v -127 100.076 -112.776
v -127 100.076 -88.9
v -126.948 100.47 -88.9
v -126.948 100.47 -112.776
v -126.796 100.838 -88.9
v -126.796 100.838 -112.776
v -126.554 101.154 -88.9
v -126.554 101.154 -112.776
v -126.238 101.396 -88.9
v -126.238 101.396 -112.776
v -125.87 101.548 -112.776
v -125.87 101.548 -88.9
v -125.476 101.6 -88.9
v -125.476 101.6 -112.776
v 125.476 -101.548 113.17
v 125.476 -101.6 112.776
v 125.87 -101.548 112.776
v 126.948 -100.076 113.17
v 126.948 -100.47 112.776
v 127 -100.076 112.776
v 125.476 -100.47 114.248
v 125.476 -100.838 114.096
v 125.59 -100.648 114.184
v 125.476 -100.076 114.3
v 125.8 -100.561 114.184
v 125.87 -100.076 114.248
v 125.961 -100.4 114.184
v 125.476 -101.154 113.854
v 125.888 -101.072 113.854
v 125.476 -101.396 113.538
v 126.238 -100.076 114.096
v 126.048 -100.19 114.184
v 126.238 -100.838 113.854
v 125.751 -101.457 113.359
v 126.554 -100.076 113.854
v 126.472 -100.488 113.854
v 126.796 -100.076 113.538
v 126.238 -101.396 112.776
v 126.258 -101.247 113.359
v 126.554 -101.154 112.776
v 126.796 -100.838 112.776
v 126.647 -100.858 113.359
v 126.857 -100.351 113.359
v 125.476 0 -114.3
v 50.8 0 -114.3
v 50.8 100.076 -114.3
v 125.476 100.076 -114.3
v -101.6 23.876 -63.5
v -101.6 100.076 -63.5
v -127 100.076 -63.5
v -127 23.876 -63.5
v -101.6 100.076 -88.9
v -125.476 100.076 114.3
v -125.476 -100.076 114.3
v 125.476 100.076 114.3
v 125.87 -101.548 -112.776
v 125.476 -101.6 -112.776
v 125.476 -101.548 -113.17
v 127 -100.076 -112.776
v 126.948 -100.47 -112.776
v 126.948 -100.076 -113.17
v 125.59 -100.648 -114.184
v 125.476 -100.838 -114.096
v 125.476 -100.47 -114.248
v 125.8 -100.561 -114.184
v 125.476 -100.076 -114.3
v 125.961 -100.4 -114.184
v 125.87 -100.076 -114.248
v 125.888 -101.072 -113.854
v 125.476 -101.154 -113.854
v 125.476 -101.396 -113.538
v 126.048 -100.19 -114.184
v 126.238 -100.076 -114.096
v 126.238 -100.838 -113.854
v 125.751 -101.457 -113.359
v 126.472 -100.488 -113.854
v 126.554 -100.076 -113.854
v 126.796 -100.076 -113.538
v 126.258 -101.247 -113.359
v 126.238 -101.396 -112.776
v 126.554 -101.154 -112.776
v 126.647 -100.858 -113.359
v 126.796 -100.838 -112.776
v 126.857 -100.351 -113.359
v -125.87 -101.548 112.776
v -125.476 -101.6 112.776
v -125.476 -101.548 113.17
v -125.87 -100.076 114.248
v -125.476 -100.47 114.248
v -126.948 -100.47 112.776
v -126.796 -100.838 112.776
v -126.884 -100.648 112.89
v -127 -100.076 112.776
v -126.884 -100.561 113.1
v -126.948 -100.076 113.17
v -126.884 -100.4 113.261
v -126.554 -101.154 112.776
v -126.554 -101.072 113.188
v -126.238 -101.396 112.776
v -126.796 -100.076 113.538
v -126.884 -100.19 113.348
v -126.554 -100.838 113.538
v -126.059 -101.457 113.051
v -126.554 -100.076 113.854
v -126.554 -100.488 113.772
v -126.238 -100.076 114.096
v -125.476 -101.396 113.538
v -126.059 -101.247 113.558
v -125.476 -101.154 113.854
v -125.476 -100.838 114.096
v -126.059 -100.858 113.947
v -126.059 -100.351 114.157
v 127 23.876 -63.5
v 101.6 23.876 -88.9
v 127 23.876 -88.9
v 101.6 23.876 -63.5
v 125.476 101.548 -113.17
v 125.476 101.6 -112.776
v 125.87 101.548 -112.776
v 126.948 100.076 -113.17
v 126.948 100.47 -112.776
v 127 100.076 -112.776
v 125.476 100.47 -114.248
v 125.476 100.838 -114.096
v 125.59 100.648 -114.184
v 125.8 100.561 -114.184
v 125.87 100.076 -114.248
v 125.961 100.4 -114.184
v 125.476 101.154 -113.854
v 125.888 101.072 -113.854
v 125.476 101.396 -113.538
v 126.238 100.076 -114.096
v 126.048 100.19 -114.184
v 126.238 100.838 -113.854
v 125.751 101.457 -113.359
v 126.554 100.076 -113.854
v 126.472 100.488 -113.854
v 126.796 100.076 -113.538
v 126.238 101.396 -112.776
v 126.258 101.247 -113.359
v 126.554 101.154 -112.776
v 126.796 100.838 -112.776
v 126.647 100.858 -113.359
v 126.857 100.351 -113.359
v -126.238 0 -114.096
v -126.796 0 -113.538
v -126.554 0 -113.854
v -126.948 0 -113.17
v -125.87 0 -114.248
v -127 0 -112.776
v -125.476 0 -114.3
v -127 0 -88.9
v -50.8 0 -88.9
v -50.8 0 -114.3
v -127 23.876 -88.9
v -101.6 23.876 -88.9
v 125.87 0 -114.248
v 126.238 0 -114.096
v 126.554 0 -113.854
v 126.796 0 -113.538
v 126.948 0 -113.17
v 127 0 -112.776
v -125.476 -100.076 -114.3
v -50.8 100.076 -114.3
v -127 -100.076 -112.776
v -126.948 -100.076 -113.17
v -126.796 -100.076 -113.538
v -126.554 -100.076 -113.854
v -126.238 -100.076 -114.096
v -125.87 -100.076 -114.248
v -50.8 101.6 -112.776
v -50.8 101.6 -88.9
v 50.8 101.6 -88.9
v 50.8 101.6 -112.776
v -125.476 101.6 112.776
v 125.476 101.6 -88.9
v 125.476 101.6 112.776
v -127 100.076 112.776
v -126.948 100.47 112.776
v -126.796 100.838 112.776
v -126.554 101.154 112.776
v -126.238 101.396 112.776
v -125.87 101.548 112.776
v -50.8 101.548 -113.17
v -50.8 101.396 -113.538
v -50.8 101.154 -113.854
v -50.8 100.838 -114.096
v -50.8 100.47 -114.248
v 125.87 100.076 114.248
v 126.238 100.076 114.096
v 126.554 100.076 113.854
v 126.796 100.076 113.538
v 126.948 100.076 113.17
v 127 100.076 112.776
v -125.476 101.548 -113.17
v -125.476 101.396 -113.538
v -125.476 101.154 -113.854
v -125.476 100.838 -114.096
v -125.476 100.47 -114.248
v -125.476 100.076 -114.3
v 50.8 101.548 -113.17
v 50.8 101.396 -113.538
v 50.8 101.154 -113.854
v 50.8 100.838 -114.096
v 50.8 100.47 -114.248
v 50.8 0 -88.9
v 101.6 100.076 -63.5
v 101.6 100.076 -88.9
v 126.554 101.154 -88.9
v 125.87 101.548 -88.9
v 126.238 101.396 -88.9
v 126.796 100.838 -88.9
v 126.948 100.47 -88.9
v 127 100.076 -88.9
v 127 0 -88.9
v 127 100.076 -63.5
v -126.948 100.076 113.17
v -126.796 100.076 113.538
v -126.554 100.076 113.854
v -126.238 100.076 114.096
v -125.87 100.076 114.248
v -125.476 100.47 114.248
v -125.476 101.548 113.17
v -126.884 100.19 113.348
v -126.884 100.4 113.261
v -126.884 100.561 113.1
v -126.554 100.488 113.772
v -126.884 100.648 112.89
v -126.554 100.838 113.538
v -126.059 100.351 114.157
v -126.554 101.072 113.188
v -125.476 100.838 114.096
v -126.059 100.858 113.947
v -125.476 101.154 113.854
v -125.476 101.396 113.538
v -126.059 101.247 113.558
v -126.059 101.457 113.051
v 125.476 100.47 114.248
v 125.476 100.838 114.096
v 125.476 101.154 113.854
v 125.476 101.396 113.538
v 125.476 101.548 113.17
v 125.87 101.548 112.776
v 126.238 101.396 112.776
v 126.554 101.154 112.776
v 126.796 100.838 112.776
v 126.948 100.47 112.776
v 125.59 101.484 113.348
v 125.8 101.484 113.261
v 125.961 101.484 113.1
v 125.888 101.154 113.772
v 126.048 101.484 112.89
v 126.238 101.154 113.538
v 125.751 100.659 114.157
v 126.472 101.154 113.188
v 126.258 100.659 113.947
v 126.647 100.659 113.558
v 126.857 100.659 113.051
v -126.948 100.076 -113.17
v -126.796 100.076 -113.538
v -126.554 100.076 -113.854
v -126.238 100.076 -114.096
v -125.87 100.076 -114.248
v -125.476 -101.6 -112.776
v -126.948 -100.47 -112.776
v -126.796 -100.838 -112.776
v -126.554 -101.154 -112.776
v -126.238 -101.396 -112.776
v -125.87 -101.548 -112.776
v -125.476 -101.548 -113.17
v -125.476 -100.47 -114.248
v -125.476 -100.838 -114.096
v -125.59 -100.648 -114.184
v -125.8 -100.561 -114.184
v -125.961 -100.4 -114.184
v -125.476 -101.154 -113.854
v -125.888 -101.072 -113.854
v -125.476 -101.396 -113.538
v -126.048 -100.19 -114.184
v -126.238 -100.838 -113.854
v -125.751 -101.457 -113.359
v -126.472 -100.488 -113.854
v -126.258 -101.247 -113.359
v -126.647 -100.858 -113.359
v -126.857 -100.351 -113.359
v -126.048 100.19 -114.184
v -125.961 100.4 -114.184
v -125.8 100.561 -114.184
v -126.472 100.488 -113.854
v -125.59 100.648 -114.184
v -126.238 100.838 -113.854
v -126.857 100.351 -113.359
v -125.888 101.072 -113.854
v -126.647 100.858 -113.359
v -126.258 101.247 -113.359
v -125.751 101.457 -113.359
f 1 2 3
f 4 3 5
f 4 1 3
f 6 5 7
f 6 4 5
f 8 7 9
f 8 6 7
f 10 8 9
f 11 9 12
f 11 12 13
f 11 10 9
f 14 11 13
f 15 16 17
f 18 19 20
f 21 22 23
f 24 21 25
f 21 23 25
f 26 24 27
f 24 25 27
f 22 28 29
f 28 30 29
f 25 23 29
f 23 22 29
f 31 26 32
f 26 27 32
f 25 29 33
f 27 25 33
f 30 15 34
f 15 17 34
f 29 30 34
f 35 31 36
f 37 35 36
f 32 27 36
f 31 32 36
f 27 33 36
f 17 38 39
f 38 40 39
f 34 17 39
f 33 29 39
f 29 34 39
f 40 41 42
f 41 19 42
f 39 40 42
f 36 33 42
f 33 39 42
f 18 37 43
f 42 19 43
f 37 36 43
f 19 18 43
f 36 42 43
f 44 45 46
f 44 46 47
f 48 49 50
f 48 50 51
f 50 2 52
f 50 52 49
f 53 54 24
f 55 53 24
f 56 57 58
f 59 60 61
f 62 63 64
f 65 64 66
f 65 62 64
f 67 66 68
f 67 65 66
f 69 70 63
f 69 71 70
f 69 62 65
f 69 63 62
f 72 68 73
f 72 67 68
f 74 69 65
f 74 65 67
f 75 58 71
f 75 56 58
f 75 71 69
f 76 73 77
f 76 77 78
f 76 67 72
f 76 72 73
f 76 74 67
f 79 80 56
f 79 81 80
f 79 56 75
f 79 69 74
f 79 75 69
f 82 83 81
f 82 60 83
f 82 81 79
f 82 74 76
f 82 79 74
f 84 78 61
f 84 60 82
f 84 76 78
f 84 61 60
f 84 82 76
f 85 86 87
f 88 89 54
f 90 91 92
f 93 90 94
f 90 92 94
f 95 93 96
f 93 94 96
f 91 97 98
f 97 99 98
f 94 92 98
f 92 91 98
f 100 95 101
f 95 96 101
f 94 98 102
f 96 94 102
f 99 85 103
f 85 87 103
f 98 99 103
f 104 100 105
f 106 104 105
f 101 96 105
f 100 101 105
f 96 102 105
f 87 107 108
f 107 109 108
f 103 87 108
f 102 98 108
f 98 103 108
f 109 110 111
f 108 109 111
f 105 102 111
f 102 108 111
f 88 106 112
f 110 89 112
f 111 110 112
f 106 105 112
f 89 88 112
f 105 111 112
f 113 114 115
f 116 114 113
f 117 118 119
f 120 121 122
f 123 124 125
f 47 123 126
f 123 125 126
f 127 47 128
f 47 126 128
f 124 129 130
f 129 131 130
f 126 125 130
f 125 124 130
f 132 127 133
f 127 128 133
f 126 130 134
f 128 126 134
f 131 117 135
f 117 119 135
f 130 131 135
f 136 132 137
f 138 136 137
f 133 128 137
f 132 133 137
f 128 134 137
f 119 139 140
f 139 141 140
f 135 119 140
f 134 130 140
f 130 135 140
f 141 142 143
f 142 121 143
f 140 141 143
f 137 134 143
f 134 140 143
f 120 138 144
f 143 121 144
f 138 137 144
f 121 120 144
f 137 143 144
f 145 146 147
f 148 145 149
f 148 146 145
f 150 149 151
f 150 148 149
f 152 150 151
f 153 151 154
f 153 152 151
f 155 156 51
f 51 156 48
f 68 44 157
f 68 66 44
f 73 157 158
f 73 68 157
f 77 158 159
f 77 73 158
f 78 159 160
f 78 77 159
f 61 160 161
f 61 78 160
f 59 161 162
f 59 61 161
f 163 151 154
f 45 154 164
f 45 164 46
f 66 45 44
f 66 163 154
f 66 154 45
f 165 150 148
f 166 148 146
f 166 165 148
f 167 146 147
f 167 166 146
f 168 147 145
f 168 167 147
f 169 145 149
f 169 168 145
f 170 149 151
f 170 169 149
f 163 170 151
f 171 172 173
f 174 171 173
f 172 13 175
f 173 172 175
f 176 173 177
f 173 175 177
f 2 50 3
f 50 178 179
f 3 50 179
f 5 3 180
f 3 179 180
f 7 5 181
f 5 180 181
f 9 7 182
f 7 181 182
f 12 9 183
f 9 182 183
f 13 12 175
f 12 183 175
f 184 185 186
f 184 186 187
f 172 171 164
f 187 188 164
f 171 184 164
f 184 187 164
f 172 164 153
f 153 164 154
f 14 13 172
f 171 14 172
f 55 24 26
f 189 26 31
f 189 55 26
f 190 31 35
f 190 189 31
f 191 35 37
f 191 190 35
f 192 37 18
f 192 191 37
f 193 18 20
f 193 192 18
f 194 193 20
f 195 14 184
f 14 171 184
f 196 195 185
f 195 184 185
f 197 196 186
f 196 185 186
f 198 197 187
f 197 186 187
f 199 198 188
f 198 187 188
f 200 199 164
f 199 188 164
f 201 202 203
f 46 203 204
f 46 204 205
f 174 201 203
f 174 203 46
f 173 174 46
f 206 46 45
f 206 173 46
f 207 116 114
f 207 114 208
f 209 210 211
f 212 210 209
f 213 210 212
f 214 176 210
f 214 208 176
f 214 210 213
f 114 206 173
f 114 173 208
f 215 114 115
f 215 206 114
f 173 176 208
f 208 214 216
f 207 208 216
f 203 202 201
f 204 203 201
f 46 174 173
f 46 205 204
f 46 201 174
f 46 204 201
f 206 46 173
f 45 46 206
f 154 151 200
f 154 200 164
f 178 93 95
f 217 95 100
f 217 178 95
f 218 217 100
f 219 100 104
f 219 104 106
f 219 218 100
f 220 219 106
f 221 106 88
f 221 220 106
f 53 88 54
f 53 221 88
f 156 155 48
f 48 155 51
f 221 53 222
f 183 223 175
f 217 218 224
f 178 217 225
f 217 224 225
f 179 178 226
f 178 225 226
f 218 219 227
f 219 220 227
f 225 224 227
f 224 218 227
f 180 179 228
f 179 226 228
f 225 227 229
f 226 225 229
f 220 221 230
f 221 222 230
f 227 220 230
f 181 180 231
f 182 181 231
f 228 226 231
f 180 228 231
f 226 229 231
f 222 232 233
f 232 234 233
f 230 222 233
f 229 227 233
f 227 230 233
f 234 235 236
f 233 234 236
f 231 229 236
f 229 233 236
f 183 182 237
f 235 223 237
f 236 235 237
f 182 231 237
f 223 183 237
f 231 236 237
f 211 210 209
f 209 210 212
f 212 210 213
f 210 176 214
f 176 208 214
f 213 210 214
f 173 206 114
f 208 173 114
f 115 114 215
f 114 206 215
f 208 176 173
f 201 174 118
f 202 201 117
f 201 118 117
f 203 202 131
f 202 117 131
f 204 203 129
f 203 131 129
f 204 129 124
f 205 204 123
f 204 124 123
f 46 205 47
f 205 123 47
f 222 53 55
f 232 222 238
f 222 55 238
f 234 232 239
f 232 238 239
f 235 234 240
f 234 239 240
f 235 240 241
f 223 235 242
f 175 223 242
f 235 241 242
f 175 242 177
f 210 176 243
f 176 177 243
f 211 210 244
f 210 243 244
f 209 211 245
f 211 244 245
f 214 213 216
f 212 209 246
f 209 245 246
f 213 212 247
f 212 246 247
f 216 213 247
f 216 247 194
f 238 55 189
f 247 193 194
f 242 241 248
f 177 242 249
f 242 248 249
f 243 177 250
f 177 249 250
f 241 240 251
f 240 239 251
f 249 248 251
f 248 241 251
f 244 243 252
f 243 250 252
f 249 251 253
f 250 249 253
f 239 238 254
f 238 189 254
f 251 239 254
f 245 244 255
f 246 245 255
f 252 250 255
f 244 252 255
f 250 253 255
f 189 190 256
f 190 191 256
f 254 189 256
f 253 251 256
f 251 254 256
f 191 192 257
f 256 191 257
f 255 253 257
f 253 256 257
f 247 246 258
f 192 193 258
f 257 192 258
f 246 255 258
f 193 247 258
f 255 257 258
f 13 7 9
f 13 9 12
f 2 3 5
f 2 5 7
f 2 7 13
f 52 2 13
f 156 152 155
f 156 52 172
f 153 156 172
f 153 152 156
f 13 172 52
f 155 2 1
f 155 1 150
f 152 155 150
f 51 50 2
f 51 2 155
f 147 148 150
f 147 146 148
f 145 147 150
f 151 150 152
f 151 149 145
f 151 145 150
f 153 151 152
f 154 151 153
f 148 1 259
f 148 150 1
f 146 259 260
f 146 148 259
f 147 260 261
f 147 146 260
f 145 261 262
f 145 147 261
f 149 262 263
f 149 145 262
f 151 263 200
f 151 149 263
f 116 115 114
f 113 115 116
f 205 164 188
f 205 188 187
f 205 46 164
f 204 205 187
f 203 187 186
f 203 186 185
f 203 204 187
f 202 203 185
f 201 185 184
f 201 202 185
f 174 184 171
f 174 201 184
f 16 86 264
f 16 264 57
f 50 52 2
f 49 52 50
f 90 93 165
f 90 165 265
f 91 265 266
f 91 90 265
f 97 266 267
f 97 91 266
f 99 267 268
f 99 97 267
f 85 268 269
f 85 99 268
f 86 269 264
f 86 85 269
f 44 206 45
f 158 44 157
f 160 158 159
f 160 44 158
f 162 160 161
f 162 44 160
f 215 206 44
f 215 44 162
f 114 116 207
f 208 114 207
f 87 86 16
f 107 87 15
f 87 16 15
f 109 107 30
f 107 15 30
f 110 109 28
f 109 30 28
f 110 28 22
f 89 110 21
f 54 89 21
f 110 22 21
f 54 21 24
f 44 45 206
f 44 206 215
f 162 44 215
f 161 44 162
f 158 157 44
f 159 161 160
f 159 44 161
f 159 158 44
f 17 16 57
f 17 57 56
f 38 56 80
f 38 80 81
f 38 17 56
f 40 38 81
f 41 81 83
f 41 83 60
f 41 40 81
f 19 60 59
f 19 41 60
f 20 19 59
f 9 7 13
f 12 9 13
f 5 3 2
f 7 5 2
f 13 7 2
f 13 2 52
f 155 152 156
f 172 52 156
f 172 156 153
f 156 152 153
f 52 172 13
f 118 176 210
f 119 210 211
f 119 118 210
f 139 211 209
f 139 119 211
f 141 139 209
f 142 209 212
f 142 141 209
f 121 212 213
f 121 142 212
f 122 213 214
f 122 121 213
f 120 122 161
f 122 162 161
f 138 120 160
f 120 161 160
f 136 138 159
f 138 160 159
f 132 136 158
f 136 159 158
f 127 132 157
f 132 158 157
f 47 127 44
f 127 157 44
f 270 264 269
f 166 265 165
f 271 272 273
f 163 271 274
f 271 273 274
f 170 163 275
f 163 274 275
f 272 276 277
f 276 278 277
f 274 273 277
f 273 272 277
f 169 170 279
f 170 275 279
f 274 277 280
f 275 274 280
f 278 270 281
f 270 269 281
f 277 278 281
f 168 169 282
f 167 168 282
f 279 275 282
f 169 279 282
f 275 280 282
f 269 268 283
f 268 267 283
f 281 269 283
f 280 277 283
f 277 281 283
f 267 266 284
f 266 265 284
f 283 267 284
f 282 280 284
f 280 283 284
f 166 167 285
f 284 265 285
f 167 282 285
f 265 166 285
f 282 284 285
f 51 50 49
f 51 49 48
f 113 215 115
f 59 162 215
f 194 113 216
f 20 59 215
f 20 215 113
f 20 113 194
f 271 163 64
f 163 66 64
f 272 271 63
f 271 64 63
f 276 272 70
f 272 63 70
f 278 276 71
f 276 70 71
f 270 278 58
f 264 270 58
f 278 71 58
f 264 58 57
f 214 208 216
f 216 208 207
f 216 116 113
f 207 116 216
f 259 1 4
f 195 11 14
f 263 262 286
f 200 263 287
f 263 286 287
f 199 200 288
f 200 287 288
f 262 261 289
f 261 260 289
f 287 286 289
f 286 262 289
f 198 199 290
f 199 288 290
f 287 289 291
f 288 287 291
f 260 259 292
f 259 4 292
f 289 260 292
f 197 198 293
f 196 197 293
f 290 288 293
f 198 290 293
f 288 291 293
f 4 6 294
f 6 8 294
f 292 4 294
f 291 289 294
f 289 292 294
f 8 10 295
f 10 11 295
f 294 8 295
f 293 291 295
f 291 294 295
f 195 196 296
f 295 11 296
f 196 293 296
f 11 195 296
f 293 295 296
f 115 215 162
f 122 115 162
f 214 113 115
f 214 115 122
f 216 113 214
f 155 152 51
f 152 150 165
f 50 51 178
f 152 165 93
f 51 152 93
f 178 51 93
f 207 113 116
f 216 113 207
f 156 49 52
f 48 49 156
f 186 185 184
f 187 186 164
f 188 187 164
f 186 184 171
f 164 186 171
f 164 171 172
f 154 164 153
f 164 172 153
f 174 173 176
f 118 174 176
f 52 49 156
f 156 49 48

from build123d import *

# Parameters (mm, degrees)
F0_W      = 254
F0_H      = 228.6
F1_DEPTH  = 101.6
F2_W      = 76.2
F2_H      = 101.6
F3_DEPTH  = 25.4
F4_DEPTH  = 25.4
F5_R      = 1.524
F5_2_R    = 1.524
F5_3_R    = 1.524
F6_W      = 76.2
F6_H      = 25.4
F7_DEPTH  = 25.4
F8_DEPTH  = 25.4
F9_W      = 76.2
F9_H      = 25.4
F10_DEPTH = 25.4
F11_DEPTH = 25.4


with BuildPart() as f1:
    # F0 (on Front) → F1 (new body, symmetric)
    with BuildSketch(Plane.XZ):
        Rectangle(F0_W, F0_H)
    extrude(amount=F1_DEPTH, both=True)

    # F2 (on face) → F3 (cut)
    with BuildSketch(Plane(origin=(0, 0, -114.3), x_dir=(1, 0, 0), z_dir=(0, 0, -1))):
        with Locations((88.9, -50.8)):
            Rectangle(F2_W, F2_H)
        with Locations((-88.9, -50.8)):
            Rectangle(F2_W, F2_H)
    extrude(amount=-F3_DEPTH, mode=Mode.SUBTRACT)


with BuildPart() as f4:
    # F4 (new): a face of the model
    f4_faces = [f1.part.faces().sort_by_distance(p)[0] for p in [
        (88.9, 50.8, -88.9),
    ]]
    extrude(f4_faces, amount=F4_DEPTH)

    # F5#2
    f5_2_edges = [f4.edges().sort_by_distance(p)[0] for p in [
        (127, 101.6, -101.6),
        (88.9, 101.6, -114.3),
        (127, 50.8, -114.3),
    ]]
    fillet(f5_2_edges, radius=F5_2_R)



with BuildPart() as f4b:
    # F4#2 (new): a face of the model
    f4_2_faces = [f1.part.faces().sort_by_distance(p)[0] for p in [
        (-88.9, 50.8, -88.9),
    ]]
    extrude(f4_2_faces, amount=F4_DEPTH)

    # F5#3
    f5_3_edges = [f4b.edges().sort_by_distance(p)[0] for p in [
        (-127, 101.6, -101.6),
        (-127, 50.8, -114.3),
        (-88.9, 101.6, -114.3),
    ]]
    fillet(f5_3_edges, radius=F5_3_R)



with BuildPart() as f1_1:
    add(f1.part)

    # F5
    f5_edges = [f1_1.edges().sort_by_distance(p)[0] for p in [
        (127, -101.6, 0),
        (0, -101.6, 114.3),
        (-127, -101.6, 0),
        (0, -101.6, -114.3),
        (127, 0, 114.3),
        (0, 101.6, 114.3),
        (-127, 0, 114.3),
        (127, 101.6, 12.7),
        (-127, 101.6, 12.7),
        (-127, -50.8, -114.3),
        (0, 101.6, -114.3),
        (127, -50.8, -114.3),
    ]]
    fillet(f5_edges, radius=F5_R)

    # F6 (on face) → F7 (cut)
    with BuildSketch(Plane.YZ.offset(127)):
        with Locations((61.976, -76.2)):
            Rectangle(F6_W, F6_H)
    extrude(amount=-F7_DEPTH, mode=Mode.SUBTRACT)


with BuildPart() as f4_1:
    add(f4.part)
    # F8 (add): a face of the model
    f8_faces = [f1_1.part.faces().sort_by_distance(p)[0] for p in [
        (101.6, 61.976, -76.2),
    ]]
    extrude(f8_faces, amount=F8_DEPTH)


with BuildPart() as f1_2:
    add(f1_1.part)

    # F9 (on face) → F10 (cut)
    with BuildSketch(Plane(origin=(-127, 0, 0), x_dir=(0, -1, 0), z_dir=(-1, 0, 0))):
        with Locations((-61.976, -76.2)):
            Rectangle(F9_W, F9_H)
    extrude(amount=-F10_DEPTH, mode=Mode.SUBTRACT)


with BuildPart() as f4b_1:
    add(f4b.part)
    # F11 (add): a face of the model
    f11_faces = [f1_2.part.faces().sort_by_distance(p)[0] for p in [
        (-101.6, 61.976, -76.2),
    ]]
    extrude(f11_faces, amount=F11_DEPTH)


solid = Compound([f4_1.part, f1_2.part, f4b_1.part])
